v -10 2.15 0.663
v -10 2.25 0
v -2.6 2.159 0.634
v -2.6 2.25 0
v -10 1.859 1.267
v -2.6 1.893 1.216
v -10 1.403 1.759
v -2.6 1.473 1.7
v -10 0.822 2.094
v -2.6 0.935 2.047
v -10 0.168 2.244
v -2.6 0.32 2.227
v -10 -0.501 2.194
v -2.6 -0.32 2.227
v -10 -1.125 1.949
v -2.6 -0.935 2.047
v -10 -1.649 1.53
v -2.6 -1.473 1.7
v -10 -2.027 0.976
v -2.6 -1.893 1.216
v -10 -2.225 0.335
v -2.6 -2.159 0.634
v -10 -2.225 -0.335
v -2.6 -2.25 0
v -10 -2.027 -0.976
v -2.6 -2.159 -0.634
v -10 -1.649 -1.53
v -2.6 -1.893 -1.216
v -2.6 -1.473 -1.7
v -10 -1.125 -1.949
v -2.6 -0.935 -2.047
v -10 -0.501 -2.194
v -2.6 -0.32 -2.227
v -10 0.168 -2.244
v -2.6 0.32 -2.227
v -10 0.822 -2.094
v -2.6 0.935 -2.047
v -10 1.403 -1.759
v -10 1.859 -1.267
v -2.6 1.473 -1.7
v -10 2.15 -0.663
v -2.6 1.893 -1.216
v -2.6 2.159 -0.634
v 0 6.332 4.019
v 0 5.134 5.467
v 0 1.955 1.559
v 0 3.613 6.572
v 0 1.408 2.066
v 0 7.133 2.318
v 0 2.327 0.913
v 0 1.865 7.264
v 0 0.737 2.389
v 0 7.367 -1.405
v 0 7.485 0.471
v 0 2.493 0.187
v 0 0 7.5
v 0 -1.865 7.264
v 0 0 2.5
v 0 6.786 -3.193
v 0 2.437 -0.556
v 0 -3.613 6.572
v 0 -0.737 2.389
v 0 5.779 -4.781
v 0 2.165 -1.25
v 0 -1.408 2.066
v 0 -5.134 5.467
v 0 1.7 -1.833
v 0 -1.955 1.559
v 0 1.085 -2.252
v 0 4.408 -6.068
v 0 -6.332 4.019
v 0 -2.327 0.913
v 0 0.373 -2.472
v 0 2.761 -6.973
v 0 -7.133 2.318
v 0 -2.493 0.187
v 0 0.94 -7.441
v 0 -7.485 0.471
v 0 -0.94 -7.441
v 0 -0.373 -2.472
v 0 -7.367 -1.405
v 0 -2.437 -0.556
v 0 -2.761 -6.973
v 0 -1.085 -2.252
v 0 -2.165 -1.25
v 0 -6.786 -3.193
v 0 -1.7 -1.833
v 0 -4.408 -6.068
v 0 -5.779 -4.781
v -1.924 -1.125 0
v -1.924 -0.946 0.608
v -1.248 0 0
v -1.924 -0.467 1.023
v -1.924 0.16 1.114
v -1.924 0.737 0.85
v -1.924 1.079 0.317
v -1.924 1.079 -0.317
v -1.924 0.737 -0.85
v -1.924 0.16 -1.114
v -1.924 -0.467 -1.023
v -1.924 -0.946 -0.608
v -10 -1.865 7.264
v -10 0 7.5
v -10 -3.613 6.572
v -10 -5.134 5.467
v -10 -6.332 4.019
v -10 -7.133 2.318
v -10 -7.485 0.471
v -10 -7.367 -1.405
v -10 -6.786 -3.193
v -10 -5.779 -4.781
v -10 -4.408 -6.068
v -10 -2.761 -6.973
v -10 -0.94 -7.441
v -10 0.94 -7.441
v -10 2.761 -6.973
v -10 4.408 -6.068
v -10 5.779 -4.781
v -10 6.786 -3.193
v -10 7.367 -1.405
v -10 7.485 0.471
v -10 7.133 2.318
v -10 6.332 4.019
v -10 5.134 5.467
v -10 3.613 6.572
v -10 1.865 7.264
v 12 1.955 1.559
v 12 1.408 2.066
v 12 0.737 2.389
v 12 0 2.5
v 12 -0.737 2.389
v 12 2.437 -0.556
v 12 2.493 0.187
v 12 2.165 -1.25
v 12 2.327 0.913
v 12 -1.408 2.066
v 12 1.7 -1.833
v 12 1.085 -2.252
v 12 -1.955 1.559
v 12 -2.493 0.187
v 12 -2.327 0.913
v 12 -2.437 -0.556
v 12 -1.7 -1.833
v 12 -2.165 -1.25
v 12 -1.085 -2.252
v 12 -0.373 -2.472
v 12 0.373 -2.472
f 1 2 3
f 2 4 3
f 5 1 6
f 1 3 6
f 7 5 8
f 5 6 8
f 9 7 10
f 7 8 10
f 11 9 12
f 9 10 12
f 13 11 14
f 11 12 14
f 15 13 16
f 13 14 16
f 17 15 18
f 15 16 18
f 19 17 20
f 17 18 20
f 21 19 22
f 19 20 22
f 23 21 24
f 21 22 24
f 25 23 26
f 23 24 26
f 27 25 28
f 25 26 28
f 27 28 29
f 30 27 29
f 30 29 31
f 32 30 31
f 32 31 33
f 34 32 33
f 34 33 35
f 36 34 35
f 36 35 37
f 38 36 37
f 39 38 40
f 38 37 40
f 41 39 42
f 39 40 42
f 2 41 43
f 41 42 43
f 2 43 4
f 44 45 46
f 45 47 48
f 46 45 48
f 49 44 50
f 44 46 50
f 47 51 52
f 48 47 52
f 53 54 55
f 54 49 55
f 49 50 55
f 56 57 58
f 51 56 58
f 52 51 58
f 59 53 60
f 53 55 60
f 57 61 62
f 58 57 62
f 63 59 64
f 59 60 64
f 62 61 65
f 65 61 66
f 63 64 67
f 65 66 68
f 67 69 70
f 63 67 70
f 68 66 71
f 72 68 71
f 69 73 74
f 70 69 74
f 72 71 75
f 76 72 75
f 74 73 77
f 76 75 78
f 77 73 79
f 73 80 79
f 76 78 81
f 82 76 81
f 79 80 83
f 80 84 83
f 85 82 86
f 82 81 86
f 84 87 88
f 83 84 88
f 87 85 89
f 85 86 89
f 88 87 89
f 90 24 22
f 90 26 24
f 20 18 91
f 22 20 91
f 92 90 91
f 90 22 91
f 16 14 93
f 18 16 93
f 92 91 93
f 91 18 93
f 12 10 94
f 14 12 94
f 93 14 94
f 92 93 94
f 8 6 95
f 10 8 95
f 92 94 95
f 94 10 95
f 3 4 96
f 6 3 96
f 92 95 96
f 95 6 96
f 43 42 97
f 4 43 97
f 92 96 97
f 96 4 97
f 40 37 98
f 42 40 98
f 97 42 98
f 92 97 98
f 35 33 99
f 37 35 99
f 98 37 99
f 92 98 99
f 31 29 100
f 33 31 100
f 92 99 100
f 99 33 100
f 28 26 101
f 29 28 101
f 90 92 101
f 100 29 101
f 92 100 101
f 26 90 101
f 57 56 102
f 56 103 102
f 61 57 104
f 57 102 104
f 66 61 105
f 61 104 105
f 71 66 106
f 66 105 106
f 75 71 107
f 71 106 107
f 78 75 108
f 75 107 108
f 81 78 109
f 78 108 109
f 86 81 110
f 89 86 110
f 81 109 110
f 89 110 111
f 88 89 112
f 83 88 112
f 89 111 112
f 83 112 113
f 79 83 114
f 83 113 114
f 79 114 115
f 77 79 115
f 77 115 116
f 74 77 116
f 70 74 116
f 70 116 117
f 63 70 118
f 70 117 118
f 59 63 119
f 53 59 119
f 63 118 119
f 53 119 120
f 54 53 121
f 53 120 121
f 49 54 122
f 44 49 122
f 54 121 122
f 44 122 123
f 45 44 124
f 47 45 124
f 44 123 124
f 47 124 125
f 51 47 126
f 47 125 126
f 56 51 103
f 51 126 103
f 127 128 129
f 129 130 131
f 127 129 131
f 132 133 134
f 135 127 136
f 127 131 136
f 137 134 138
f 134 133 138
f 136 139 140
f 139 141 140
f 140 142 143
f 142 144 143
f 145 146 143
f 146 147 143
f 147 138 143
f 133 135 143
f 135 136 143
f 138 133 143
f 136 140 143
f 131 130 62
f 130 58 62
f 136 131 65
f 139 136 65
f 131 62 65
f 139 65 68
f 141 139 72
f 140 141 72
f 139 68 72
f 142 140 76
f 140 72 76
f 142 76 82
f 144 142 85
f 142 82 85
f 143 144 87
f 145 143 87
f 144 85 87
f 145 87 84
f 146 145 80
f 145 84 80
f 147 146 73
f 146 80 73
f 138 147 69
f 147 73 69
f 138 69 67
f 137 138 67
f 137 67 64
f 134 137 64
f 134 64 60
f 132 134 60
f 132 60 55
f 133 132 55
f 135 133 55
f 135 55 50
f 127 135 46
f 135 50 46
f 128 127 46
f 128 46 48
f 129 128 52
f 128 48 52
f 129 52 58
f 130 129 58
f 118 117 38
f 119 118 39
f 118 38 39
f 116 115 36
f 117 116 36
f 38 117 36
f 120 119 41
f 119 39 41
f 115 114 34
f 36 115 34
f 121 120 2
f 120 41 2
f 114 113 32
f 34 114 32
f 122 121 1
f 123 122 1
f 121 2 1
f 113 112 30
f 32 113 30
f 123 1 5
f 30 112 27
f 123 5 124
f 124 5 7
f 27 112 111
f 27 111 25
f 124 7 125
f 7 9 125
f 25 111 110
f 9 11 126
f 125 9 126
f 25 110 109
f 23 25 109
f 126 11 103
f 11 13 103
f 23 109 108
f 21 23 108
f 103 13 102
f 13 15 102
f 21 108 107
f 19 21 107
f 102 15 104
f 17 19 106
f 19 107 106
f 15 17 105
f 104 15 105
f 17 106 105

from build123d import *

# Parameters (mm, degrees)
F3_D     = 4.5
F3_DEPTH = 7.4
F3_TIP   = 1.3519363928


with BuildPart() as f1:
    # F0 (on Front) → F1 (revolve)
    with BuildSketch(Plane.XZ):
        Polygon((0, 7.5), (-10, 7.5), (-10, 0), (12, 0), (12, 2.5), (0, 2.5), align=None)
    revolve(axis=Axis((1, 0, 0), (1, 0, 0)))

    # F3
    with Locations(Plane(origin=(-10, 0, 0), x_dir=(0, -1, 0), z_dir=(-1, 0, 0))):
        with Locations((0, 0)):
            Hole(F3_D / 2, depth=F3_DEPTH)
            with Locations((0, 0, -(F3_DEPTH + F3_TIP / 2))):  # 118° drill point
                Cone(0, F3_D / 2, F3_TIP, mode=Mode.SUBTRACT)


solid = f1.part
